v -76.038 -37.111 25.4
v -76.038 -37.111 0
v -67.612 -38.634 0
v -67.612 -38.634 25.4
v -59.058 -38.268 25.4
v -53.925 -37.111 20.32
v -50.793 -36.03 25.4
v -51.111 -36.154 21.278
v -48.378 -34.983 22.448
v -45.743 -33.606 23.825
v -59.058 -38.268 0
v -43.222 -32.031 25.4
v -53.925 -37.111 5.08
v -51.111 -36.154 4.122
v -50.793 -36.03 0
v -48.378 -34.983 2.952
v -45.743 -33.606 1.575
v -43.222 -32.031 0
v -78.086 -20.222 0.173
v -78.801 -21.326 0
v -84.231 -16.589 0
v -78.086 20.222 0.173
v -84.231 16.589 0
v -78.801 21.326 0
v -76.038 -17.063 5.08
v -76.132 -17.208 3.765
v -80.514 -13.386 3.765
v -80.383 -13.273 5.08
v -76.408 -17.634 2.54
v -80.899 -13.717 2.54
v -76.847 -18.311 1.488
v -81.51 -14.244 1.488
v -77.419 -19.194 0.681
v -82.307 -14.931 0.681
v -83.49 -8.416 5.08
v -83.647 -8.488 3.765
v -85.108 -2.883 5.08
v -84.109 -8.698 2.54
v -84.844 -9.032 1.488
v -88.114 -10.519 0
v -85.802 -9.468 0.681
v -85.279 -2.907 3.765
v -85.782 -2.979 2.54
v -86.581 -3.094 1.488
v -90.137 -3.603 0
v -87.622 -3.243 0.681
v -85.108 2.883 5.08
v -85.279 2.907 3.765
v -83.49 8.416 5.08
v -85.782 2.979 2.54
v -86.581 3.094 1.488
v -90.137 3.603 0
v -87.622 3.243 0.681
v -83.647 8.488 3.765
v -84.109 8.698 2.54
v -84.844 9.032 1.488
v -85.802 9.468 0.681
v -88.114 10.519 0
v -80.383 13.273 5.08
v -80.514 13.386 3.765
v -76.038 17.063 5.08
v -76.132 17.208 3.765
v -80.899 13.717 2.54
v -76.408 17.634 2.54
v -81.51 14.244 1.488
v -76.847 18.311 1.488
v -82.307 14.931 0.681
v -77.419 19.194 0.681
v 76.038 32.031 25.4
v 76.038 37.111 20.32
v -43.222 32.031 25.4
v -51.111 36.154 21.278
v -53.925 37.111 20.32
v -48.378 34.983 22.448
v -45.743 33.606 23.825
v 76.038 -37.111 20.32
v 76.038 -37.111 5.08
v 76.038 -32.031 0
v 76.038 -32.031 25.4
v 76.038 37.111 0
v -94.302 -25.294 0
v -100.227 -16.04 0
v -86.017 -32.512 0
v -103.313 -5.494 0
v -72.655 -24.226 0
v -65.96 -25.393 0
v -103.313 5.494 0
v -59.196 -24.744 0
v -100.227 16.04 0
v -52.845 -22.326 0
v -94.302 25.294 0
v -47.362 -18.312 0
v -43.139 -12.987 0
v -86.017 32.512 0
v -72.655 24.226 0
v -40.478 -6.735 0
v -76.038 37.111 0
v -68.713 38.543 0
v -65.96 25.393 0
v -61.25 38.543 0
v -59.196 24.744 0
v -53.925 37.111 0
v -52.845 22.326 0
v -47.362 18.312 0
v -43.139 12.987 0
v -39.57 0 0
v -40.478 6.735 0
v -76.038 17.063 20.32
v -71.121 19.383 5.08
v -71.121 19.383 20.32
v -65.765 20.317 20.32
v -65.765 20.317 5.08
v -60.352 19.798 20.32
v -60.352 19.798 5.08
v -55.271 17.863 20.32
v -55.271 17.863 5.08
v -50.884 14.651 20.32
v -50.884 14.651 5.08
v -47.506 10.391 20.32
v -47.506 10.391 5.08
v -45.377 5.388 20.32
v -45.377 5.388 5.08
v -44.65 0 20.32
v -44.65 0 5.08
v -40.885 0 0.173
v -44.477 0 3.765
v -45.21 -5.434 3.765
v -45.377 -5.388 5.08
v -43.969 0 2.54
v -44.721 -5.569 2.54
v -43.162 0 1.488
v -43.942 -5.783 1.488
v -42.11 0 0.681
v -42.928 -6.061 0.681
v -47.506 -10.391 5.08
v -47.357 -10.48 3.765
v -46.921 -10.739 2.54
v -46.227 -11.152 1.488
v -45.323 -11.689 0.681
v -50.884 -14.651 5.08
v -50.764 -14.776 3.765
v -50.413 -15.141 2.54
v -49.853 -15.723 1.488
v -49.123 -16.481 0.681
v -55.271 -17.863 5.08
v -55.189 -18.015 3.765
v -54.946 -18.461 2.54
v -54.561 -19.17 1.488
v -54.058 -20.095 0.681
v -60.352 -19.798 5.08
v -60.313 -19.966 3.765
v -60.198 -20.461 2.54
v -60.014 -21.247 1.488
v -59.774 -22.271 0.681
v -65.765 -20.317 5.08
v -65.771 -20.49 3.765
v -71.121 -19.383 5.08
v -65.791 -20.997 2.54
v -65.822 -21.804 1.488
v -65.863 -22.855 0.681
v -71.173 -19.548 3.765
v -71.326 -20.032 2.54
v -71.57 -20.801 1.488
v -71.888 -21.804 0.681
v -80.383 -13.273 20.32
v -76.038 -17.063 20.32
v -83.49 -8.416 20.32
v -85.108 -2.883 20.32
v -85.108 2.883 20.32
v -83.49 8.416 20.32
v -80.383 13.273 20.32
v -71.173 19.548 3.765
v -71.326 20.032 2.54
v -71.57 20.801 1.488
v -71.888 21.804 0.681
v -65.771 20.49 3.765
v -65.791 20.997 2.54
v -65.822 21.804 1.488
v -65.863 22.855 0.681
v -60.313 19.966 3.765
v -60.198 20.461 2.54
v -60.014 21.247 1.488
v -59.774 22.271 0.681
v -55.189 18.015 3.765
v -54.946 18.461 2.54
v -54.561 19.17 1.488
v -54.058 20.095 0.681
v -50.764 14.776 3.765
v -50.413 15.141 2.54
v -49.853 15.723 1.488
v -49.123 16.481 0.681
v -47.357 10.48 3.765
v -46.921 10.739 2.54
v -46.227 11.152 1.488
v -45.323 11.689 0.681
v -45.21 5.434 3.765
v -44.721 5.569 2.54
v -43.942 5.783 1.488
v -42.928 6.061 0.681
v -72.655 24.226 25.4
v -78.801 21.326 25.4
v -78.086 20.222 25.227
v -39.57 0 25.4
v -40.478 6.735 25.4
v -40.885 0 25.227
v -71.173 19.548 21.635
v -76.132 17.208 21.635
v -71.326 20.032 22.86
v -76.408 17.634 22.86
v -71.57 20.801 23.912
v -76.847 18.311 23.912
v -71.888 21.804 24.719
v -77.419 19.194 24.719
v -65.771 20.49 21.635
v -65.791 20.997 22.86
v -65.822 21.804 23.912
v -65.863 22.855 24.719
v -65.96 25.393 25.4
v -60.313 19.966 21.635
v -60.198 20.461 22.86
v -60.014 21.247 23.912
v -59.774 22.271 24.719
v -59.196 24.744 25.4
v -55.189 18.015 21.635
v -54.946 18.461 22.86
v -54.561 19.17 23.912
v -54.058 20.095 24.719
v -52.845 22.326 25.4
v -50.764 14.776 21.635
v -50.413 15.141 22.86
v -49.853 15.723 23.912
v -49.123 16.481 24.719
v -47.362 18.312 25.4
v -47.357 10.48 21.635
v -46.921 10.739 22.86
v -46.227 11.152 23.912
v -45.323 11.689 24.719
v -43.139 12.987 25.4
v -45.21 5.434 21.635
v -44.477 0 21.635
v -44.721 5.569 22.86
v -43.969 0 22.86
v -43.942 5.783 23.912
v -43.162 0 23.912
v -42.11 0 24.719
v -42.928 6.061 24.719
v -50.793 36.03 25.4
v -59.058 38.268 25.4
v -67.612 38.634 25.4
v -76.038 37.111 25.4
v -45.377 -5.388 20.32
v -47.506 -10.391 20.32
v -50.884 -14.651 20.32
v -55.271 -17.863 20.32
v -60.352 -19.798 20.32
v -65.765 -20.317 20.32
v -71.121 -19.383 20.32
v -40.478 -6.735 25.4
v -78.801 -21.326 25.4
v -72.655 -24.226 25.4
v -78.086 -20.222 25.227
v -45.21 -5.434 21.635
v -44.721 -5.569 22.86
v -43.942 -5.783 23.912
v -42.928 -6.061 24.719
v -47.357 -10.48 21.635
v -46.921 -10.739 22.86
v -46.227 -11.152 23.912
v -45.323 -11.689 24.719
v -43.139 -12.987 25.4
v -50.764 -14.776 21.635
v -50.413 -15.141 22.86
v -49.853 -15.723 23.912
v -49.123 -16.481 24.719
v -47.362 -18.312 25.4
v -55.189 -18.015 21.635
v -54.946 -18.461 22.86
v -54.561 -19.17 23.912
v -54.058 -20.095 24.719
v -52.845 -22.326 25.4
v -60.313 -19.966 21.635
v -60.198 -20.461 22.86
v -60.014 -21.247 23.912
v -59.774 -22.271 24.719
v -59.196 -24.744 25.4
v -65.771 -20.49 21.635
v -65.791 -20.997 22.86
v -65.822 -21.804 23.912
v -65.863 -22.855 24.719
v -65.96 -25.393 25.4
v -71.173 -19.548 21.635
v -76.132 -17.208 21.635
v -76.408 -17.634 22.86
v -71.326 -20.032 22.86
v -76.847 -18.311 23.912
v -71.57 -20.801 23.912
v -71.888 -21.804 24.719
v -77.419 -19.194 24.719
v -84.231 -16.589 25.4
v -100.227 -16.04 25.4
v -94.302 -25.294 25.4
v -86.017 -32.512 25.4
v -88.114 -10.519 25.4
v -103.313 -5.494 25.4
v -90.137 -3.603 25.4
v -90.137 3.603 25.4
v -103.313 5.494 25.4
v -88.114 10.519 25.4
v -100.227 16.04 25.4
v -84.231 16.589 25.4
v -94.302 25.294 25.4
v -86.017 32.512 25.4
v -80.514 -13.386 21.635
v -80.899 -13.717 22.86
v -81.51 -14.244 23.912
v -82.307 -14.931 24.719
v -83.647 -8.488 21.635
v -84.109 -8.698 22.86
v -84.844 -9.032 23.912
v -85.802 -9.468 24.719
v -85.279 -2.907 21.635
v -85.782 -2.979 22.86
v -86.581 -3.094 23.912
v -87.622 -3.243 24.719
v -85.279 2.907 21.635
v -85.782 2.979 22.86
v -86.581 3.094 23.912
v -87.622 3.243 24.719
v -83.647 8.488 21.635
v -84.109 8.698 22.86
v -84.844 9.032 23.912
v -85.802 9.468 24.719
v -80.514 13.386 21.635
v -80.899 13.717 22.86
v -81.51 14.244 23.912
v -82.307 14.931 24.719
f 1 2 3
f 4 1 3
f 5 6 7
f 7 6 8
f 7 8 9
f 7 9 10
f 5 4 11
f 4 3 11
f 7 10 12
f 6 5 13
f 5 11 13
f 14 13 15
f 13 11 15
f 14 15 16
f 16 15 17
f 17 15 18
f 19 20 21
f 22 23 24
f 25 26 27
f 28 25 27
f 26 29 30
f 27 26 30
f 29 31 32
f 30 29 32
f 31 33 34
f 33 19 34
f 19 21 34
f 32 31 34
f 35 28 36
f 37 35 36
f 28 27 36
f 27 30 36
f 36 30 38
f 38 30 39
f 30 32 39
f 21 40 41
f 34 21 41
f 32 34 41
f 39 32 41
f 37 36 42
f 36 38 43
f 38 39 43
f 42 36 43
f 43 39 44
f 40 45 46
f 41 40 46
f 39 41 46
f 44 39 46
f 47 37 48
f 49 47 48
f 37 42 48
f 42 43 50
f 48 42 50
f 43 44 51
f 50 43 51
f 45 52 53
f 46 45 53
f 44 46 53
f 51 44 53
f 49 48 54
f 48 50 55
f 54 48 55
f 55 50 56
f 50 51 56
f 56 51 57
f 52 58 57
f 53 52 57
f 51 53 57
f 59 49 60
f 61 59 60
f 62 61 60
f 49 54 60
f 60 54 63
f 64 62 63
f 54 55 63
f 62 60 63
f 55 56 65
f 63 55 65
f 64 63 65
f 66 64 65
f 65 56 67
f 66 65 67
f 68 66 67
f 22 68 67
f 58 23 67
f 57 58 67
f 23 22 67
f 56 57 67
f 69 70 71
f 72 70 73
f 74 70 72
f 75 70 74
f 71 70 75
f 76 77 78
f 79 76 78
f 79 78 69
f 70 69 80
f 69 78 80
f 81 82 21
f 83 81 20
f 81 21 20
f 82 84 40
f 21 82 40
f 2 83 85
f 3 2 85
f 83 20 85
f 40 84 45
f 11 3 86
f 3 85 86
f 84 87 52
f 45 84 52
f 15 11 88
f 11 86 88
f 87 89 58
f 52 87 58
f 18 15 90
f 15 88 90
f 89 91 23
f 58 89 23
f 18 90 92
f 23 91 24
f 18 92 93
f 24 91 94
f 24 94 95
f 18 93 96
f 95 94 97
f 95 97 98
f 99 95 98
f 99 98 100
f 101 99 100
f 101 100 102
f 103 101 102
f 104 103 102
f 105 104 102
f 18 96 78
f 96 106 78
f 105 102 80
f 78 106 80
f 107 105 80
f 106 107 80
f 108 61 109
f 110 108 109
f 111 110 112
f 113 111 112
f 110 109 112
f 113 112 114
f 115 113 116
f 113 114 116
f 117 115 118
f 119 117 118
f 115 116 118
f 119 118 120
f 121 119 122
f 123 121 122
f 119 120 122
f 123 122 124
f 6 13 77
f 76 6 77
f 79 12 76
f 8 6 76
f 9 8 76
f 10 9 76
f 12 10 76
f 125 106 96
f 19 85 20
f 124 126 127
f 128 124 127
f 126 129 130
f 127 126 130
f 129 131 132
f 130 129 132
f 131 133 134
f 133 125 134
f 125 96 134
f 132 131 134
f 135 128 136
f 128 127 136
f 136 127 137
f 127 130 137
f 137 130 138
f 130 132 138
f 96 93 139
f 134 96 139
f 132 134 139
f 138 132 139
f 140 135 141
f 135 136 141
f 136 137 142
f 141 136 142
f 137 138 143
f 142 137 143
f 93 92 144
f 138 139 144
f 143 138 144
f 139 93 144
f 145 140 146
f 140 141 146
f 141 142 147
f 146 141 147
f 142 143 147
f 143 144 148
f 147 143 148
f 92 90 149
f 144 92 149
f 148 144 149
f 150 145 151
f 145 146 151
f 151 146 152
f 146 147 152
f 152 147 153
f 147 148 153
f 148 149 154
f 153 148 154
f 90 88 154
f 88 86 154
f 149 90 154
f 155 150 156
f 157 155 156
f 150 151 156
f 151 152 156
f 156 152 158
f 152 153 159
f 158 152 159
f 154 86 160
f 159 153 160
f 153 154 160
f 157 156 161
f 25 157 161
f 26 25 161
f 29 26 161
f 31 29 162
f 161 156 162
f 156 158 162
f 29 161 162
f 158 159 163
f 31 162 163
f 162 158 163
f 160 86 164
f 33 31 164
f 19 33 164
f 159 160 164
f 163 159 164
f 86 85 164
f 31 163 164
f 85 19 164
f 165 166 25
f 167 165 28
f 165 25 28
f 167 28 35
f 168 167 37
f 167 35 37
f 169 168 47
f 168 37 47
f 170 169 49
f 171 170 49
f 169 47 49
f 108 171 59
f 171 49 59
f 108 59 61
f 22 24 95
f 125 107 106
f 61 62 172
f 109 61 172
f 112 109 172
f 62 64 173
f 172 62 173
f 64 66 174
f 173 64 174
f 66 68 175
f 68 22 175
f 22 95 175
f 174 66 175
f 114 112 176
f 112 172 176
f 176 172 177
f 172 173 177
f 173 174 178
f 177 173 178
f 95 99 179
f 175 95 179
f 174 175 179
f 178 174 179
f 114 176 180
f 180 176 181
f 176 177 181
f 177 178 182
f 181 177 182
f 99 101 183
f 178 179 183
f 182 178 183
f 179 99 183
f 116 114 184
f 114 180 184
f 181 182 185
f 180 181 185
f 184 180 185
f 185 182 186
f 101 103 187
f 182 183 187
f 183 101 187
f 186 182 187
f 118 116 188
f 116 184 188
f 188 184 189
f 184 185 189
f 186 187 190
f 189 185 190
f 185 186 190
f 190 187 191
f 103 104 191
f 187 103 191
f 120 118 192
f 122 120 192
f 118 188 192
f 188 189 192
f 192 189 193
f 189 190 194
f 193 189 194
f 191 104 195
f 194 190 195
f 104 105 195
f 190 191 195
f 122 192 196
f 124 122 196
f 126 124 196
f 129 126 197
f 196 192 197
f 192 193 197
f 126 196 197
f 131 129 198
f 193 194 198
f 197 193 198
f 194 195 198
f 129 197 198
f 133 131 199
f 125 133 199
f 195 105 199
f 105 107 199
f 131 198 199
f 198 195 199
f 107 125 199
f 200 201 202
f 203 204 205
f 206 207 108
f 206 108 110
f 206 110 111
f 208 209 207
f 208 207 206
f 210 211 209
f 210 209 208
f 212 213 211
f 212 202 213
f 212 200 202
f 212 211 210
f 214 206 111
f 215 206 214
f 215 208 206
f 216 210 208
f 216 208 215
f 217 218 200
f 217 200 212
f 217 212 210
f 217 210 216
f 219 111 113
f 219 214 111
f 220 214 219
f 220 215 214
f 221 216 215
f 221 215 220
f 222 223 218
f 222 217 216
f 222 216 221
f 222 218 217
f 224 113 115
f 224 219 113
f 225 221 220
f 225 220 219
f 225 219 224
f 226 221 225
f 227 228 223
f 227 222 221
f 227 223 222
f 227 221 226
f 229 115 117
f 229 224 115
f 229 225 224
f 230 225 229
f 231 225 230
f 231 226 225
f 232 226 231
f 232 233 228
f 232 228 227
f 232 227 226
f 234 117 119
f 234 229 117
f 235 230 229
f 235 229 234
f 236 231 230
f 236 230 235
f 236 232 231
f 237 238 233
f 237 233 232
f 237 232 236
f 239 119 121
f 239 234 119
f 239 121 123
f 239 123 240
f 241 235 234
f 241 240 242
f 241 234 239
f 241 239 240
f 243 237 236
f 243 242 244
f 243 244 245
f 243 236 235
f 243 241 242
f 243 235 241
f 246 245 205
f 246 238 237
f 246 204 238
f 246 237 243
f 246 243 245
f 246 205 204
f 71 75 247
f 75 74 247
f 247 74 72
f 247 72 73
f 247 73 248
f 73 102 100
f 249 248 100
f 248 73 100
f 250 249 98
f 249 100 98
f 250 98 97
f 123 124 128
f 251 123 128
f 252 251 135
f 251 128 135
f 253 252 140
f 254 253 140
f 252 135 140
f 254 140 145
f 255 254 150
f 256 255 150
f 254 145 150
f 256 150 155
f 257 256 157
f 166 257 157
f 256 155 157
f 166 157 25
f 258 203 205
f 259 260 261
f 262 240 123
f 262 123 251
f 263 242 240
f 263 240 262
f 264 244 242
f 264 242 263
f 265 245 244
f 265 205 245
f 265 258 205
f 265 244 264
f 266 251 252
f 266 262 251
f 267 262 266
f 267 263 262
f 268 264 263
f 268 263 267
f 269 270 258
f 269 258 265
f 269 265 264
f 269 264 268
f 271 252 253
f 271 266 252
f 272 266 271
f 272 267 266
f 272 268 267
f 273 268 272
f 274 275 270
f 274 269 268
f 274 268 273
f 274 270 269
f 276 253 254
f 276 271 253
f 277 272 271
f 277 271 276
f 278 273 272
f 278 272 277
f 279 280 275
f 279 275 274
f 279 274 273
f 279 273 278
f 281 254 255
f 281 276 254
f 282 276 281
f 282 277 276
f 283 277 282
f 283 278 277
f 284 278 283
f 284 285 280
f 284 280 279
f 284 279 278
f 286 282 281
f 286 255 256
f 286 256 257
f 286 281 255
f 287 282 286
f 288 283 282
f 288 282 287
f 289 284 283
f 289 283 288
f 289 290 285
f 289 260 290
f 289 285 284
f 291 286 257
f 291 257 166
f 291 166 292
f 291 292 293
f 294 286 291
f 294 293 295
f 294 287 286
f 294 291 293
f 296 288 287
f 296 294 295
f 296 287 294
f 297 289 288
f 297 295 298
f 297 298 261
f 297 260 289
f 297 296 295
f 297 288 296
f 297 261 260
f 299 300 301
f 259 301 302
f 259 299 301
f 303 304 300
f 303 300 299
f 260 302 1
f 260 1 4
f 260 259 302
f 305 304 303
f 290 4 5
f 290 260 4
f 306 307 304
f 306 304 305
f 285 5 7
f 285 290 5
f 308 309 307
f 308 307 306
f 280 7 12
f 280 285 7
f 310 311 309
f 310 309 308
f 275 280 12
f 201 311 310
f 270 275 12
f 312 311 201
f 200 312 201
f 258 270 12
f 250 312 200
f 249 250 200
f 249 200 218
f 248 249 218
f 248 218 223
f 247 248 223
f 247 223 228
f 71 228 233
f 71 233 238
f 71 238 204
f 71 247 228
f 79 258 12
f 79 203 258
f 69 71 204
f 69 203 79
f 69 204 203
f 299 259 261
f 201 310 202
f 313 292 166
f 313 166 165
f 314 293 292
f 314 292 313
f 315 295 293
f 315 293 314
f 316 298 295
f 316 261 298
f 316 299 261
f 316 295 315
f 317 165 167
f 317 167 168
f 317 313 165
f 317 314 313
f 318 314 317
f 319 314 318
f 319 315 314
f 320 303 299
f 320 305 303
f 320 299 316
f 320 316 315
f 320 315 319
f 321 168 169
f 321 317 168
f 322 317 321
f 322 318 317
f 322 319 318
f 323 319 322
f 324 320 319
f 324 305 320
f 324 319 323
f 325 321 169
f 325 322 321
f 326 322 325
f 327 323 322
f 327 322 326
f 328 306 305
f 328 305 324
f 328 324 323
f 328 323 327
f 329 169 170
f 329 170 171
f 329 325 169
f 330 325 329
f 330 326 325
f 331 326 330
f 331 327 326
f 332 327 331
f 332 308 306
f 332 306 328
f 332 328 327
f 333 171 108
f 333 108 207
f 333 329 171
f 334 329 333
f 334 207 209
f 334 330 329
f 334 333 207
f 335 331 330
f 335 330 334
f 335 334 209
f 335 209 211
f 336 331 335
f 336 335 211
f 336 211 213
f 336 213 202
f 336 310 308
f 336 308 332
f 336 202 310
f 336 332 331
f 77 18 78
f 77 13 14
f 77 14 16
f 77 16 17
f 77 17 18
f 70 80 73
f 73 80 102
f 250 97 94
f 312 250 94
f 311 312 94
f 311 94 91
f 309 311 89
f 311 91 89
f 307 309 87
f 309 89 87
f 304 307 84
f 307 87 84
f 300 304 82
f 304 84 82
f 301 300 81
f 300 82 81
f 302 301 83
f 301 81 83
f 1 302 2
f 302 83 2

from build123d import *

# Parameters (mm, degrees)
F1_DEPTH = 25.4
F2_R     = 5.08
F3_R     = 5.08
F4_SIZE  = 5.08


with BuildPart() as f1:
    # F0 (on Top) → F1 (new body)
    with BuildSketch(Plane.XY):
        with BuildLine():
            Line((-76.0381892323, -17.0626985246), (-76.0381892323, -37.1113419533))
            Line((-76.0381892323, -37.1113419533), (-53.9251491427, -37.1113419533))
            ThreePointArc((-53.9251491427, -37.1113419533), (-33.9361871958, -23.1446837303), (-26.2583127076, 0))
            ThreePointArc((-26.2583127076, 0), (-33.9361871958, 23.1446837303), (-53.9251491427, 37.1113419533))
            Line((-53.9251491427, 37.1113419533), (-76.0381892323, 37.1113419533))
            Line((-76.0381892323, 37.1113419533), (-76.0381892323, 17.0626985246))
            ThreePointArc((-76.0381892323, 17.0626985246), (-55.2712803961, 17.8631090788), (-44.6498636494, 0))
            ThreePointArc((-44.6498636494, 0), (-55.2712803961, -17.8631090788), (-76.0381892323, -17.0626985246))
        make_face()
        with BuildLine():
            ThreePointArc((-76.0381892323, 37.1113419533), (-103.7050256675, 0), (-76.0381892323, -37.1113419533))
            Line((-76.0381892323, -37.1113419533), (-76.0381892323, -17.0626985246))
            ThreePointArc((-76.0381892323, -17.0626985246), (-85.3134747257, 0), (-76.0381892323, 17.0626985246))
            Line((-76.0381892323, 17.0626985246), (-76.0381892323, 37.1113419533))
        make_face()
        with BuildLine():
            Line((-53.9251491427, -37.1113419533), (-76.0381892323, -37.1113419533))
            ThreePointArc((-76.0381892323, -37.1113419533), (-64.9816691875, -38.72335648), (-53.9251491427, -37.1113419533))
        make_face()
        with BuildLine():
            ThreePointArc((-26.2583127076, 0), (-33.9361871958, -23.1446837303), (-53.9251491427, -37.1113419533))
            Line((-53.9251491427, -37.1113419533), (76.0381892323, -37.1113419533))
            Line((76.0381892323, -37.1113419533), (76.0381892323, 37.1113419533))
            Line((76.0381892323, 37.1113419533), (-53.9251491427, 37.1113419533))
            ThreePointArc((-53.9251491427, 37.1113419533), (-33.9361871958, 23.1446837303), (-26.2583127076, 0))
        make_face()
        with BuildLine():
            ThreePointArc((-53.9251491427, 37.1113419533), (-64.9816691875, 38.72335648), (-76.0381892323, 37.1113419533))
            Line((-76.0381892323, 37.1113419533), (-53.9251491427, 37.1113419533))
        make_face()
    extrude(amount=F1_DEPTH)

    # F2
    f2_edges = [f1.edges().sort_by_distance(p)[0] for p in [
        (-85.313475, 0, 25.4),
    ]]
    fillet(f2_edges, radius=F2_R)

    # F3
    f3_edges = [f1.edges().sort_by_distance(p)[0] for p in [
        (-85.313475, 0, 0),
    ]]
    fillet(f3_edges, radius=F3_R)

    # F4
    f4_edges = [f1.edges().sort_by_distance(p)[0] for p in [
        (11.05652, -37.111342, 25.4),
        (11.05652, 37.111342, 25.4),
        (11.05652, -37.111342, 0),
    ]]
    chamfer(f4_edges, length=F4_SIZE)


solid = f1.part
